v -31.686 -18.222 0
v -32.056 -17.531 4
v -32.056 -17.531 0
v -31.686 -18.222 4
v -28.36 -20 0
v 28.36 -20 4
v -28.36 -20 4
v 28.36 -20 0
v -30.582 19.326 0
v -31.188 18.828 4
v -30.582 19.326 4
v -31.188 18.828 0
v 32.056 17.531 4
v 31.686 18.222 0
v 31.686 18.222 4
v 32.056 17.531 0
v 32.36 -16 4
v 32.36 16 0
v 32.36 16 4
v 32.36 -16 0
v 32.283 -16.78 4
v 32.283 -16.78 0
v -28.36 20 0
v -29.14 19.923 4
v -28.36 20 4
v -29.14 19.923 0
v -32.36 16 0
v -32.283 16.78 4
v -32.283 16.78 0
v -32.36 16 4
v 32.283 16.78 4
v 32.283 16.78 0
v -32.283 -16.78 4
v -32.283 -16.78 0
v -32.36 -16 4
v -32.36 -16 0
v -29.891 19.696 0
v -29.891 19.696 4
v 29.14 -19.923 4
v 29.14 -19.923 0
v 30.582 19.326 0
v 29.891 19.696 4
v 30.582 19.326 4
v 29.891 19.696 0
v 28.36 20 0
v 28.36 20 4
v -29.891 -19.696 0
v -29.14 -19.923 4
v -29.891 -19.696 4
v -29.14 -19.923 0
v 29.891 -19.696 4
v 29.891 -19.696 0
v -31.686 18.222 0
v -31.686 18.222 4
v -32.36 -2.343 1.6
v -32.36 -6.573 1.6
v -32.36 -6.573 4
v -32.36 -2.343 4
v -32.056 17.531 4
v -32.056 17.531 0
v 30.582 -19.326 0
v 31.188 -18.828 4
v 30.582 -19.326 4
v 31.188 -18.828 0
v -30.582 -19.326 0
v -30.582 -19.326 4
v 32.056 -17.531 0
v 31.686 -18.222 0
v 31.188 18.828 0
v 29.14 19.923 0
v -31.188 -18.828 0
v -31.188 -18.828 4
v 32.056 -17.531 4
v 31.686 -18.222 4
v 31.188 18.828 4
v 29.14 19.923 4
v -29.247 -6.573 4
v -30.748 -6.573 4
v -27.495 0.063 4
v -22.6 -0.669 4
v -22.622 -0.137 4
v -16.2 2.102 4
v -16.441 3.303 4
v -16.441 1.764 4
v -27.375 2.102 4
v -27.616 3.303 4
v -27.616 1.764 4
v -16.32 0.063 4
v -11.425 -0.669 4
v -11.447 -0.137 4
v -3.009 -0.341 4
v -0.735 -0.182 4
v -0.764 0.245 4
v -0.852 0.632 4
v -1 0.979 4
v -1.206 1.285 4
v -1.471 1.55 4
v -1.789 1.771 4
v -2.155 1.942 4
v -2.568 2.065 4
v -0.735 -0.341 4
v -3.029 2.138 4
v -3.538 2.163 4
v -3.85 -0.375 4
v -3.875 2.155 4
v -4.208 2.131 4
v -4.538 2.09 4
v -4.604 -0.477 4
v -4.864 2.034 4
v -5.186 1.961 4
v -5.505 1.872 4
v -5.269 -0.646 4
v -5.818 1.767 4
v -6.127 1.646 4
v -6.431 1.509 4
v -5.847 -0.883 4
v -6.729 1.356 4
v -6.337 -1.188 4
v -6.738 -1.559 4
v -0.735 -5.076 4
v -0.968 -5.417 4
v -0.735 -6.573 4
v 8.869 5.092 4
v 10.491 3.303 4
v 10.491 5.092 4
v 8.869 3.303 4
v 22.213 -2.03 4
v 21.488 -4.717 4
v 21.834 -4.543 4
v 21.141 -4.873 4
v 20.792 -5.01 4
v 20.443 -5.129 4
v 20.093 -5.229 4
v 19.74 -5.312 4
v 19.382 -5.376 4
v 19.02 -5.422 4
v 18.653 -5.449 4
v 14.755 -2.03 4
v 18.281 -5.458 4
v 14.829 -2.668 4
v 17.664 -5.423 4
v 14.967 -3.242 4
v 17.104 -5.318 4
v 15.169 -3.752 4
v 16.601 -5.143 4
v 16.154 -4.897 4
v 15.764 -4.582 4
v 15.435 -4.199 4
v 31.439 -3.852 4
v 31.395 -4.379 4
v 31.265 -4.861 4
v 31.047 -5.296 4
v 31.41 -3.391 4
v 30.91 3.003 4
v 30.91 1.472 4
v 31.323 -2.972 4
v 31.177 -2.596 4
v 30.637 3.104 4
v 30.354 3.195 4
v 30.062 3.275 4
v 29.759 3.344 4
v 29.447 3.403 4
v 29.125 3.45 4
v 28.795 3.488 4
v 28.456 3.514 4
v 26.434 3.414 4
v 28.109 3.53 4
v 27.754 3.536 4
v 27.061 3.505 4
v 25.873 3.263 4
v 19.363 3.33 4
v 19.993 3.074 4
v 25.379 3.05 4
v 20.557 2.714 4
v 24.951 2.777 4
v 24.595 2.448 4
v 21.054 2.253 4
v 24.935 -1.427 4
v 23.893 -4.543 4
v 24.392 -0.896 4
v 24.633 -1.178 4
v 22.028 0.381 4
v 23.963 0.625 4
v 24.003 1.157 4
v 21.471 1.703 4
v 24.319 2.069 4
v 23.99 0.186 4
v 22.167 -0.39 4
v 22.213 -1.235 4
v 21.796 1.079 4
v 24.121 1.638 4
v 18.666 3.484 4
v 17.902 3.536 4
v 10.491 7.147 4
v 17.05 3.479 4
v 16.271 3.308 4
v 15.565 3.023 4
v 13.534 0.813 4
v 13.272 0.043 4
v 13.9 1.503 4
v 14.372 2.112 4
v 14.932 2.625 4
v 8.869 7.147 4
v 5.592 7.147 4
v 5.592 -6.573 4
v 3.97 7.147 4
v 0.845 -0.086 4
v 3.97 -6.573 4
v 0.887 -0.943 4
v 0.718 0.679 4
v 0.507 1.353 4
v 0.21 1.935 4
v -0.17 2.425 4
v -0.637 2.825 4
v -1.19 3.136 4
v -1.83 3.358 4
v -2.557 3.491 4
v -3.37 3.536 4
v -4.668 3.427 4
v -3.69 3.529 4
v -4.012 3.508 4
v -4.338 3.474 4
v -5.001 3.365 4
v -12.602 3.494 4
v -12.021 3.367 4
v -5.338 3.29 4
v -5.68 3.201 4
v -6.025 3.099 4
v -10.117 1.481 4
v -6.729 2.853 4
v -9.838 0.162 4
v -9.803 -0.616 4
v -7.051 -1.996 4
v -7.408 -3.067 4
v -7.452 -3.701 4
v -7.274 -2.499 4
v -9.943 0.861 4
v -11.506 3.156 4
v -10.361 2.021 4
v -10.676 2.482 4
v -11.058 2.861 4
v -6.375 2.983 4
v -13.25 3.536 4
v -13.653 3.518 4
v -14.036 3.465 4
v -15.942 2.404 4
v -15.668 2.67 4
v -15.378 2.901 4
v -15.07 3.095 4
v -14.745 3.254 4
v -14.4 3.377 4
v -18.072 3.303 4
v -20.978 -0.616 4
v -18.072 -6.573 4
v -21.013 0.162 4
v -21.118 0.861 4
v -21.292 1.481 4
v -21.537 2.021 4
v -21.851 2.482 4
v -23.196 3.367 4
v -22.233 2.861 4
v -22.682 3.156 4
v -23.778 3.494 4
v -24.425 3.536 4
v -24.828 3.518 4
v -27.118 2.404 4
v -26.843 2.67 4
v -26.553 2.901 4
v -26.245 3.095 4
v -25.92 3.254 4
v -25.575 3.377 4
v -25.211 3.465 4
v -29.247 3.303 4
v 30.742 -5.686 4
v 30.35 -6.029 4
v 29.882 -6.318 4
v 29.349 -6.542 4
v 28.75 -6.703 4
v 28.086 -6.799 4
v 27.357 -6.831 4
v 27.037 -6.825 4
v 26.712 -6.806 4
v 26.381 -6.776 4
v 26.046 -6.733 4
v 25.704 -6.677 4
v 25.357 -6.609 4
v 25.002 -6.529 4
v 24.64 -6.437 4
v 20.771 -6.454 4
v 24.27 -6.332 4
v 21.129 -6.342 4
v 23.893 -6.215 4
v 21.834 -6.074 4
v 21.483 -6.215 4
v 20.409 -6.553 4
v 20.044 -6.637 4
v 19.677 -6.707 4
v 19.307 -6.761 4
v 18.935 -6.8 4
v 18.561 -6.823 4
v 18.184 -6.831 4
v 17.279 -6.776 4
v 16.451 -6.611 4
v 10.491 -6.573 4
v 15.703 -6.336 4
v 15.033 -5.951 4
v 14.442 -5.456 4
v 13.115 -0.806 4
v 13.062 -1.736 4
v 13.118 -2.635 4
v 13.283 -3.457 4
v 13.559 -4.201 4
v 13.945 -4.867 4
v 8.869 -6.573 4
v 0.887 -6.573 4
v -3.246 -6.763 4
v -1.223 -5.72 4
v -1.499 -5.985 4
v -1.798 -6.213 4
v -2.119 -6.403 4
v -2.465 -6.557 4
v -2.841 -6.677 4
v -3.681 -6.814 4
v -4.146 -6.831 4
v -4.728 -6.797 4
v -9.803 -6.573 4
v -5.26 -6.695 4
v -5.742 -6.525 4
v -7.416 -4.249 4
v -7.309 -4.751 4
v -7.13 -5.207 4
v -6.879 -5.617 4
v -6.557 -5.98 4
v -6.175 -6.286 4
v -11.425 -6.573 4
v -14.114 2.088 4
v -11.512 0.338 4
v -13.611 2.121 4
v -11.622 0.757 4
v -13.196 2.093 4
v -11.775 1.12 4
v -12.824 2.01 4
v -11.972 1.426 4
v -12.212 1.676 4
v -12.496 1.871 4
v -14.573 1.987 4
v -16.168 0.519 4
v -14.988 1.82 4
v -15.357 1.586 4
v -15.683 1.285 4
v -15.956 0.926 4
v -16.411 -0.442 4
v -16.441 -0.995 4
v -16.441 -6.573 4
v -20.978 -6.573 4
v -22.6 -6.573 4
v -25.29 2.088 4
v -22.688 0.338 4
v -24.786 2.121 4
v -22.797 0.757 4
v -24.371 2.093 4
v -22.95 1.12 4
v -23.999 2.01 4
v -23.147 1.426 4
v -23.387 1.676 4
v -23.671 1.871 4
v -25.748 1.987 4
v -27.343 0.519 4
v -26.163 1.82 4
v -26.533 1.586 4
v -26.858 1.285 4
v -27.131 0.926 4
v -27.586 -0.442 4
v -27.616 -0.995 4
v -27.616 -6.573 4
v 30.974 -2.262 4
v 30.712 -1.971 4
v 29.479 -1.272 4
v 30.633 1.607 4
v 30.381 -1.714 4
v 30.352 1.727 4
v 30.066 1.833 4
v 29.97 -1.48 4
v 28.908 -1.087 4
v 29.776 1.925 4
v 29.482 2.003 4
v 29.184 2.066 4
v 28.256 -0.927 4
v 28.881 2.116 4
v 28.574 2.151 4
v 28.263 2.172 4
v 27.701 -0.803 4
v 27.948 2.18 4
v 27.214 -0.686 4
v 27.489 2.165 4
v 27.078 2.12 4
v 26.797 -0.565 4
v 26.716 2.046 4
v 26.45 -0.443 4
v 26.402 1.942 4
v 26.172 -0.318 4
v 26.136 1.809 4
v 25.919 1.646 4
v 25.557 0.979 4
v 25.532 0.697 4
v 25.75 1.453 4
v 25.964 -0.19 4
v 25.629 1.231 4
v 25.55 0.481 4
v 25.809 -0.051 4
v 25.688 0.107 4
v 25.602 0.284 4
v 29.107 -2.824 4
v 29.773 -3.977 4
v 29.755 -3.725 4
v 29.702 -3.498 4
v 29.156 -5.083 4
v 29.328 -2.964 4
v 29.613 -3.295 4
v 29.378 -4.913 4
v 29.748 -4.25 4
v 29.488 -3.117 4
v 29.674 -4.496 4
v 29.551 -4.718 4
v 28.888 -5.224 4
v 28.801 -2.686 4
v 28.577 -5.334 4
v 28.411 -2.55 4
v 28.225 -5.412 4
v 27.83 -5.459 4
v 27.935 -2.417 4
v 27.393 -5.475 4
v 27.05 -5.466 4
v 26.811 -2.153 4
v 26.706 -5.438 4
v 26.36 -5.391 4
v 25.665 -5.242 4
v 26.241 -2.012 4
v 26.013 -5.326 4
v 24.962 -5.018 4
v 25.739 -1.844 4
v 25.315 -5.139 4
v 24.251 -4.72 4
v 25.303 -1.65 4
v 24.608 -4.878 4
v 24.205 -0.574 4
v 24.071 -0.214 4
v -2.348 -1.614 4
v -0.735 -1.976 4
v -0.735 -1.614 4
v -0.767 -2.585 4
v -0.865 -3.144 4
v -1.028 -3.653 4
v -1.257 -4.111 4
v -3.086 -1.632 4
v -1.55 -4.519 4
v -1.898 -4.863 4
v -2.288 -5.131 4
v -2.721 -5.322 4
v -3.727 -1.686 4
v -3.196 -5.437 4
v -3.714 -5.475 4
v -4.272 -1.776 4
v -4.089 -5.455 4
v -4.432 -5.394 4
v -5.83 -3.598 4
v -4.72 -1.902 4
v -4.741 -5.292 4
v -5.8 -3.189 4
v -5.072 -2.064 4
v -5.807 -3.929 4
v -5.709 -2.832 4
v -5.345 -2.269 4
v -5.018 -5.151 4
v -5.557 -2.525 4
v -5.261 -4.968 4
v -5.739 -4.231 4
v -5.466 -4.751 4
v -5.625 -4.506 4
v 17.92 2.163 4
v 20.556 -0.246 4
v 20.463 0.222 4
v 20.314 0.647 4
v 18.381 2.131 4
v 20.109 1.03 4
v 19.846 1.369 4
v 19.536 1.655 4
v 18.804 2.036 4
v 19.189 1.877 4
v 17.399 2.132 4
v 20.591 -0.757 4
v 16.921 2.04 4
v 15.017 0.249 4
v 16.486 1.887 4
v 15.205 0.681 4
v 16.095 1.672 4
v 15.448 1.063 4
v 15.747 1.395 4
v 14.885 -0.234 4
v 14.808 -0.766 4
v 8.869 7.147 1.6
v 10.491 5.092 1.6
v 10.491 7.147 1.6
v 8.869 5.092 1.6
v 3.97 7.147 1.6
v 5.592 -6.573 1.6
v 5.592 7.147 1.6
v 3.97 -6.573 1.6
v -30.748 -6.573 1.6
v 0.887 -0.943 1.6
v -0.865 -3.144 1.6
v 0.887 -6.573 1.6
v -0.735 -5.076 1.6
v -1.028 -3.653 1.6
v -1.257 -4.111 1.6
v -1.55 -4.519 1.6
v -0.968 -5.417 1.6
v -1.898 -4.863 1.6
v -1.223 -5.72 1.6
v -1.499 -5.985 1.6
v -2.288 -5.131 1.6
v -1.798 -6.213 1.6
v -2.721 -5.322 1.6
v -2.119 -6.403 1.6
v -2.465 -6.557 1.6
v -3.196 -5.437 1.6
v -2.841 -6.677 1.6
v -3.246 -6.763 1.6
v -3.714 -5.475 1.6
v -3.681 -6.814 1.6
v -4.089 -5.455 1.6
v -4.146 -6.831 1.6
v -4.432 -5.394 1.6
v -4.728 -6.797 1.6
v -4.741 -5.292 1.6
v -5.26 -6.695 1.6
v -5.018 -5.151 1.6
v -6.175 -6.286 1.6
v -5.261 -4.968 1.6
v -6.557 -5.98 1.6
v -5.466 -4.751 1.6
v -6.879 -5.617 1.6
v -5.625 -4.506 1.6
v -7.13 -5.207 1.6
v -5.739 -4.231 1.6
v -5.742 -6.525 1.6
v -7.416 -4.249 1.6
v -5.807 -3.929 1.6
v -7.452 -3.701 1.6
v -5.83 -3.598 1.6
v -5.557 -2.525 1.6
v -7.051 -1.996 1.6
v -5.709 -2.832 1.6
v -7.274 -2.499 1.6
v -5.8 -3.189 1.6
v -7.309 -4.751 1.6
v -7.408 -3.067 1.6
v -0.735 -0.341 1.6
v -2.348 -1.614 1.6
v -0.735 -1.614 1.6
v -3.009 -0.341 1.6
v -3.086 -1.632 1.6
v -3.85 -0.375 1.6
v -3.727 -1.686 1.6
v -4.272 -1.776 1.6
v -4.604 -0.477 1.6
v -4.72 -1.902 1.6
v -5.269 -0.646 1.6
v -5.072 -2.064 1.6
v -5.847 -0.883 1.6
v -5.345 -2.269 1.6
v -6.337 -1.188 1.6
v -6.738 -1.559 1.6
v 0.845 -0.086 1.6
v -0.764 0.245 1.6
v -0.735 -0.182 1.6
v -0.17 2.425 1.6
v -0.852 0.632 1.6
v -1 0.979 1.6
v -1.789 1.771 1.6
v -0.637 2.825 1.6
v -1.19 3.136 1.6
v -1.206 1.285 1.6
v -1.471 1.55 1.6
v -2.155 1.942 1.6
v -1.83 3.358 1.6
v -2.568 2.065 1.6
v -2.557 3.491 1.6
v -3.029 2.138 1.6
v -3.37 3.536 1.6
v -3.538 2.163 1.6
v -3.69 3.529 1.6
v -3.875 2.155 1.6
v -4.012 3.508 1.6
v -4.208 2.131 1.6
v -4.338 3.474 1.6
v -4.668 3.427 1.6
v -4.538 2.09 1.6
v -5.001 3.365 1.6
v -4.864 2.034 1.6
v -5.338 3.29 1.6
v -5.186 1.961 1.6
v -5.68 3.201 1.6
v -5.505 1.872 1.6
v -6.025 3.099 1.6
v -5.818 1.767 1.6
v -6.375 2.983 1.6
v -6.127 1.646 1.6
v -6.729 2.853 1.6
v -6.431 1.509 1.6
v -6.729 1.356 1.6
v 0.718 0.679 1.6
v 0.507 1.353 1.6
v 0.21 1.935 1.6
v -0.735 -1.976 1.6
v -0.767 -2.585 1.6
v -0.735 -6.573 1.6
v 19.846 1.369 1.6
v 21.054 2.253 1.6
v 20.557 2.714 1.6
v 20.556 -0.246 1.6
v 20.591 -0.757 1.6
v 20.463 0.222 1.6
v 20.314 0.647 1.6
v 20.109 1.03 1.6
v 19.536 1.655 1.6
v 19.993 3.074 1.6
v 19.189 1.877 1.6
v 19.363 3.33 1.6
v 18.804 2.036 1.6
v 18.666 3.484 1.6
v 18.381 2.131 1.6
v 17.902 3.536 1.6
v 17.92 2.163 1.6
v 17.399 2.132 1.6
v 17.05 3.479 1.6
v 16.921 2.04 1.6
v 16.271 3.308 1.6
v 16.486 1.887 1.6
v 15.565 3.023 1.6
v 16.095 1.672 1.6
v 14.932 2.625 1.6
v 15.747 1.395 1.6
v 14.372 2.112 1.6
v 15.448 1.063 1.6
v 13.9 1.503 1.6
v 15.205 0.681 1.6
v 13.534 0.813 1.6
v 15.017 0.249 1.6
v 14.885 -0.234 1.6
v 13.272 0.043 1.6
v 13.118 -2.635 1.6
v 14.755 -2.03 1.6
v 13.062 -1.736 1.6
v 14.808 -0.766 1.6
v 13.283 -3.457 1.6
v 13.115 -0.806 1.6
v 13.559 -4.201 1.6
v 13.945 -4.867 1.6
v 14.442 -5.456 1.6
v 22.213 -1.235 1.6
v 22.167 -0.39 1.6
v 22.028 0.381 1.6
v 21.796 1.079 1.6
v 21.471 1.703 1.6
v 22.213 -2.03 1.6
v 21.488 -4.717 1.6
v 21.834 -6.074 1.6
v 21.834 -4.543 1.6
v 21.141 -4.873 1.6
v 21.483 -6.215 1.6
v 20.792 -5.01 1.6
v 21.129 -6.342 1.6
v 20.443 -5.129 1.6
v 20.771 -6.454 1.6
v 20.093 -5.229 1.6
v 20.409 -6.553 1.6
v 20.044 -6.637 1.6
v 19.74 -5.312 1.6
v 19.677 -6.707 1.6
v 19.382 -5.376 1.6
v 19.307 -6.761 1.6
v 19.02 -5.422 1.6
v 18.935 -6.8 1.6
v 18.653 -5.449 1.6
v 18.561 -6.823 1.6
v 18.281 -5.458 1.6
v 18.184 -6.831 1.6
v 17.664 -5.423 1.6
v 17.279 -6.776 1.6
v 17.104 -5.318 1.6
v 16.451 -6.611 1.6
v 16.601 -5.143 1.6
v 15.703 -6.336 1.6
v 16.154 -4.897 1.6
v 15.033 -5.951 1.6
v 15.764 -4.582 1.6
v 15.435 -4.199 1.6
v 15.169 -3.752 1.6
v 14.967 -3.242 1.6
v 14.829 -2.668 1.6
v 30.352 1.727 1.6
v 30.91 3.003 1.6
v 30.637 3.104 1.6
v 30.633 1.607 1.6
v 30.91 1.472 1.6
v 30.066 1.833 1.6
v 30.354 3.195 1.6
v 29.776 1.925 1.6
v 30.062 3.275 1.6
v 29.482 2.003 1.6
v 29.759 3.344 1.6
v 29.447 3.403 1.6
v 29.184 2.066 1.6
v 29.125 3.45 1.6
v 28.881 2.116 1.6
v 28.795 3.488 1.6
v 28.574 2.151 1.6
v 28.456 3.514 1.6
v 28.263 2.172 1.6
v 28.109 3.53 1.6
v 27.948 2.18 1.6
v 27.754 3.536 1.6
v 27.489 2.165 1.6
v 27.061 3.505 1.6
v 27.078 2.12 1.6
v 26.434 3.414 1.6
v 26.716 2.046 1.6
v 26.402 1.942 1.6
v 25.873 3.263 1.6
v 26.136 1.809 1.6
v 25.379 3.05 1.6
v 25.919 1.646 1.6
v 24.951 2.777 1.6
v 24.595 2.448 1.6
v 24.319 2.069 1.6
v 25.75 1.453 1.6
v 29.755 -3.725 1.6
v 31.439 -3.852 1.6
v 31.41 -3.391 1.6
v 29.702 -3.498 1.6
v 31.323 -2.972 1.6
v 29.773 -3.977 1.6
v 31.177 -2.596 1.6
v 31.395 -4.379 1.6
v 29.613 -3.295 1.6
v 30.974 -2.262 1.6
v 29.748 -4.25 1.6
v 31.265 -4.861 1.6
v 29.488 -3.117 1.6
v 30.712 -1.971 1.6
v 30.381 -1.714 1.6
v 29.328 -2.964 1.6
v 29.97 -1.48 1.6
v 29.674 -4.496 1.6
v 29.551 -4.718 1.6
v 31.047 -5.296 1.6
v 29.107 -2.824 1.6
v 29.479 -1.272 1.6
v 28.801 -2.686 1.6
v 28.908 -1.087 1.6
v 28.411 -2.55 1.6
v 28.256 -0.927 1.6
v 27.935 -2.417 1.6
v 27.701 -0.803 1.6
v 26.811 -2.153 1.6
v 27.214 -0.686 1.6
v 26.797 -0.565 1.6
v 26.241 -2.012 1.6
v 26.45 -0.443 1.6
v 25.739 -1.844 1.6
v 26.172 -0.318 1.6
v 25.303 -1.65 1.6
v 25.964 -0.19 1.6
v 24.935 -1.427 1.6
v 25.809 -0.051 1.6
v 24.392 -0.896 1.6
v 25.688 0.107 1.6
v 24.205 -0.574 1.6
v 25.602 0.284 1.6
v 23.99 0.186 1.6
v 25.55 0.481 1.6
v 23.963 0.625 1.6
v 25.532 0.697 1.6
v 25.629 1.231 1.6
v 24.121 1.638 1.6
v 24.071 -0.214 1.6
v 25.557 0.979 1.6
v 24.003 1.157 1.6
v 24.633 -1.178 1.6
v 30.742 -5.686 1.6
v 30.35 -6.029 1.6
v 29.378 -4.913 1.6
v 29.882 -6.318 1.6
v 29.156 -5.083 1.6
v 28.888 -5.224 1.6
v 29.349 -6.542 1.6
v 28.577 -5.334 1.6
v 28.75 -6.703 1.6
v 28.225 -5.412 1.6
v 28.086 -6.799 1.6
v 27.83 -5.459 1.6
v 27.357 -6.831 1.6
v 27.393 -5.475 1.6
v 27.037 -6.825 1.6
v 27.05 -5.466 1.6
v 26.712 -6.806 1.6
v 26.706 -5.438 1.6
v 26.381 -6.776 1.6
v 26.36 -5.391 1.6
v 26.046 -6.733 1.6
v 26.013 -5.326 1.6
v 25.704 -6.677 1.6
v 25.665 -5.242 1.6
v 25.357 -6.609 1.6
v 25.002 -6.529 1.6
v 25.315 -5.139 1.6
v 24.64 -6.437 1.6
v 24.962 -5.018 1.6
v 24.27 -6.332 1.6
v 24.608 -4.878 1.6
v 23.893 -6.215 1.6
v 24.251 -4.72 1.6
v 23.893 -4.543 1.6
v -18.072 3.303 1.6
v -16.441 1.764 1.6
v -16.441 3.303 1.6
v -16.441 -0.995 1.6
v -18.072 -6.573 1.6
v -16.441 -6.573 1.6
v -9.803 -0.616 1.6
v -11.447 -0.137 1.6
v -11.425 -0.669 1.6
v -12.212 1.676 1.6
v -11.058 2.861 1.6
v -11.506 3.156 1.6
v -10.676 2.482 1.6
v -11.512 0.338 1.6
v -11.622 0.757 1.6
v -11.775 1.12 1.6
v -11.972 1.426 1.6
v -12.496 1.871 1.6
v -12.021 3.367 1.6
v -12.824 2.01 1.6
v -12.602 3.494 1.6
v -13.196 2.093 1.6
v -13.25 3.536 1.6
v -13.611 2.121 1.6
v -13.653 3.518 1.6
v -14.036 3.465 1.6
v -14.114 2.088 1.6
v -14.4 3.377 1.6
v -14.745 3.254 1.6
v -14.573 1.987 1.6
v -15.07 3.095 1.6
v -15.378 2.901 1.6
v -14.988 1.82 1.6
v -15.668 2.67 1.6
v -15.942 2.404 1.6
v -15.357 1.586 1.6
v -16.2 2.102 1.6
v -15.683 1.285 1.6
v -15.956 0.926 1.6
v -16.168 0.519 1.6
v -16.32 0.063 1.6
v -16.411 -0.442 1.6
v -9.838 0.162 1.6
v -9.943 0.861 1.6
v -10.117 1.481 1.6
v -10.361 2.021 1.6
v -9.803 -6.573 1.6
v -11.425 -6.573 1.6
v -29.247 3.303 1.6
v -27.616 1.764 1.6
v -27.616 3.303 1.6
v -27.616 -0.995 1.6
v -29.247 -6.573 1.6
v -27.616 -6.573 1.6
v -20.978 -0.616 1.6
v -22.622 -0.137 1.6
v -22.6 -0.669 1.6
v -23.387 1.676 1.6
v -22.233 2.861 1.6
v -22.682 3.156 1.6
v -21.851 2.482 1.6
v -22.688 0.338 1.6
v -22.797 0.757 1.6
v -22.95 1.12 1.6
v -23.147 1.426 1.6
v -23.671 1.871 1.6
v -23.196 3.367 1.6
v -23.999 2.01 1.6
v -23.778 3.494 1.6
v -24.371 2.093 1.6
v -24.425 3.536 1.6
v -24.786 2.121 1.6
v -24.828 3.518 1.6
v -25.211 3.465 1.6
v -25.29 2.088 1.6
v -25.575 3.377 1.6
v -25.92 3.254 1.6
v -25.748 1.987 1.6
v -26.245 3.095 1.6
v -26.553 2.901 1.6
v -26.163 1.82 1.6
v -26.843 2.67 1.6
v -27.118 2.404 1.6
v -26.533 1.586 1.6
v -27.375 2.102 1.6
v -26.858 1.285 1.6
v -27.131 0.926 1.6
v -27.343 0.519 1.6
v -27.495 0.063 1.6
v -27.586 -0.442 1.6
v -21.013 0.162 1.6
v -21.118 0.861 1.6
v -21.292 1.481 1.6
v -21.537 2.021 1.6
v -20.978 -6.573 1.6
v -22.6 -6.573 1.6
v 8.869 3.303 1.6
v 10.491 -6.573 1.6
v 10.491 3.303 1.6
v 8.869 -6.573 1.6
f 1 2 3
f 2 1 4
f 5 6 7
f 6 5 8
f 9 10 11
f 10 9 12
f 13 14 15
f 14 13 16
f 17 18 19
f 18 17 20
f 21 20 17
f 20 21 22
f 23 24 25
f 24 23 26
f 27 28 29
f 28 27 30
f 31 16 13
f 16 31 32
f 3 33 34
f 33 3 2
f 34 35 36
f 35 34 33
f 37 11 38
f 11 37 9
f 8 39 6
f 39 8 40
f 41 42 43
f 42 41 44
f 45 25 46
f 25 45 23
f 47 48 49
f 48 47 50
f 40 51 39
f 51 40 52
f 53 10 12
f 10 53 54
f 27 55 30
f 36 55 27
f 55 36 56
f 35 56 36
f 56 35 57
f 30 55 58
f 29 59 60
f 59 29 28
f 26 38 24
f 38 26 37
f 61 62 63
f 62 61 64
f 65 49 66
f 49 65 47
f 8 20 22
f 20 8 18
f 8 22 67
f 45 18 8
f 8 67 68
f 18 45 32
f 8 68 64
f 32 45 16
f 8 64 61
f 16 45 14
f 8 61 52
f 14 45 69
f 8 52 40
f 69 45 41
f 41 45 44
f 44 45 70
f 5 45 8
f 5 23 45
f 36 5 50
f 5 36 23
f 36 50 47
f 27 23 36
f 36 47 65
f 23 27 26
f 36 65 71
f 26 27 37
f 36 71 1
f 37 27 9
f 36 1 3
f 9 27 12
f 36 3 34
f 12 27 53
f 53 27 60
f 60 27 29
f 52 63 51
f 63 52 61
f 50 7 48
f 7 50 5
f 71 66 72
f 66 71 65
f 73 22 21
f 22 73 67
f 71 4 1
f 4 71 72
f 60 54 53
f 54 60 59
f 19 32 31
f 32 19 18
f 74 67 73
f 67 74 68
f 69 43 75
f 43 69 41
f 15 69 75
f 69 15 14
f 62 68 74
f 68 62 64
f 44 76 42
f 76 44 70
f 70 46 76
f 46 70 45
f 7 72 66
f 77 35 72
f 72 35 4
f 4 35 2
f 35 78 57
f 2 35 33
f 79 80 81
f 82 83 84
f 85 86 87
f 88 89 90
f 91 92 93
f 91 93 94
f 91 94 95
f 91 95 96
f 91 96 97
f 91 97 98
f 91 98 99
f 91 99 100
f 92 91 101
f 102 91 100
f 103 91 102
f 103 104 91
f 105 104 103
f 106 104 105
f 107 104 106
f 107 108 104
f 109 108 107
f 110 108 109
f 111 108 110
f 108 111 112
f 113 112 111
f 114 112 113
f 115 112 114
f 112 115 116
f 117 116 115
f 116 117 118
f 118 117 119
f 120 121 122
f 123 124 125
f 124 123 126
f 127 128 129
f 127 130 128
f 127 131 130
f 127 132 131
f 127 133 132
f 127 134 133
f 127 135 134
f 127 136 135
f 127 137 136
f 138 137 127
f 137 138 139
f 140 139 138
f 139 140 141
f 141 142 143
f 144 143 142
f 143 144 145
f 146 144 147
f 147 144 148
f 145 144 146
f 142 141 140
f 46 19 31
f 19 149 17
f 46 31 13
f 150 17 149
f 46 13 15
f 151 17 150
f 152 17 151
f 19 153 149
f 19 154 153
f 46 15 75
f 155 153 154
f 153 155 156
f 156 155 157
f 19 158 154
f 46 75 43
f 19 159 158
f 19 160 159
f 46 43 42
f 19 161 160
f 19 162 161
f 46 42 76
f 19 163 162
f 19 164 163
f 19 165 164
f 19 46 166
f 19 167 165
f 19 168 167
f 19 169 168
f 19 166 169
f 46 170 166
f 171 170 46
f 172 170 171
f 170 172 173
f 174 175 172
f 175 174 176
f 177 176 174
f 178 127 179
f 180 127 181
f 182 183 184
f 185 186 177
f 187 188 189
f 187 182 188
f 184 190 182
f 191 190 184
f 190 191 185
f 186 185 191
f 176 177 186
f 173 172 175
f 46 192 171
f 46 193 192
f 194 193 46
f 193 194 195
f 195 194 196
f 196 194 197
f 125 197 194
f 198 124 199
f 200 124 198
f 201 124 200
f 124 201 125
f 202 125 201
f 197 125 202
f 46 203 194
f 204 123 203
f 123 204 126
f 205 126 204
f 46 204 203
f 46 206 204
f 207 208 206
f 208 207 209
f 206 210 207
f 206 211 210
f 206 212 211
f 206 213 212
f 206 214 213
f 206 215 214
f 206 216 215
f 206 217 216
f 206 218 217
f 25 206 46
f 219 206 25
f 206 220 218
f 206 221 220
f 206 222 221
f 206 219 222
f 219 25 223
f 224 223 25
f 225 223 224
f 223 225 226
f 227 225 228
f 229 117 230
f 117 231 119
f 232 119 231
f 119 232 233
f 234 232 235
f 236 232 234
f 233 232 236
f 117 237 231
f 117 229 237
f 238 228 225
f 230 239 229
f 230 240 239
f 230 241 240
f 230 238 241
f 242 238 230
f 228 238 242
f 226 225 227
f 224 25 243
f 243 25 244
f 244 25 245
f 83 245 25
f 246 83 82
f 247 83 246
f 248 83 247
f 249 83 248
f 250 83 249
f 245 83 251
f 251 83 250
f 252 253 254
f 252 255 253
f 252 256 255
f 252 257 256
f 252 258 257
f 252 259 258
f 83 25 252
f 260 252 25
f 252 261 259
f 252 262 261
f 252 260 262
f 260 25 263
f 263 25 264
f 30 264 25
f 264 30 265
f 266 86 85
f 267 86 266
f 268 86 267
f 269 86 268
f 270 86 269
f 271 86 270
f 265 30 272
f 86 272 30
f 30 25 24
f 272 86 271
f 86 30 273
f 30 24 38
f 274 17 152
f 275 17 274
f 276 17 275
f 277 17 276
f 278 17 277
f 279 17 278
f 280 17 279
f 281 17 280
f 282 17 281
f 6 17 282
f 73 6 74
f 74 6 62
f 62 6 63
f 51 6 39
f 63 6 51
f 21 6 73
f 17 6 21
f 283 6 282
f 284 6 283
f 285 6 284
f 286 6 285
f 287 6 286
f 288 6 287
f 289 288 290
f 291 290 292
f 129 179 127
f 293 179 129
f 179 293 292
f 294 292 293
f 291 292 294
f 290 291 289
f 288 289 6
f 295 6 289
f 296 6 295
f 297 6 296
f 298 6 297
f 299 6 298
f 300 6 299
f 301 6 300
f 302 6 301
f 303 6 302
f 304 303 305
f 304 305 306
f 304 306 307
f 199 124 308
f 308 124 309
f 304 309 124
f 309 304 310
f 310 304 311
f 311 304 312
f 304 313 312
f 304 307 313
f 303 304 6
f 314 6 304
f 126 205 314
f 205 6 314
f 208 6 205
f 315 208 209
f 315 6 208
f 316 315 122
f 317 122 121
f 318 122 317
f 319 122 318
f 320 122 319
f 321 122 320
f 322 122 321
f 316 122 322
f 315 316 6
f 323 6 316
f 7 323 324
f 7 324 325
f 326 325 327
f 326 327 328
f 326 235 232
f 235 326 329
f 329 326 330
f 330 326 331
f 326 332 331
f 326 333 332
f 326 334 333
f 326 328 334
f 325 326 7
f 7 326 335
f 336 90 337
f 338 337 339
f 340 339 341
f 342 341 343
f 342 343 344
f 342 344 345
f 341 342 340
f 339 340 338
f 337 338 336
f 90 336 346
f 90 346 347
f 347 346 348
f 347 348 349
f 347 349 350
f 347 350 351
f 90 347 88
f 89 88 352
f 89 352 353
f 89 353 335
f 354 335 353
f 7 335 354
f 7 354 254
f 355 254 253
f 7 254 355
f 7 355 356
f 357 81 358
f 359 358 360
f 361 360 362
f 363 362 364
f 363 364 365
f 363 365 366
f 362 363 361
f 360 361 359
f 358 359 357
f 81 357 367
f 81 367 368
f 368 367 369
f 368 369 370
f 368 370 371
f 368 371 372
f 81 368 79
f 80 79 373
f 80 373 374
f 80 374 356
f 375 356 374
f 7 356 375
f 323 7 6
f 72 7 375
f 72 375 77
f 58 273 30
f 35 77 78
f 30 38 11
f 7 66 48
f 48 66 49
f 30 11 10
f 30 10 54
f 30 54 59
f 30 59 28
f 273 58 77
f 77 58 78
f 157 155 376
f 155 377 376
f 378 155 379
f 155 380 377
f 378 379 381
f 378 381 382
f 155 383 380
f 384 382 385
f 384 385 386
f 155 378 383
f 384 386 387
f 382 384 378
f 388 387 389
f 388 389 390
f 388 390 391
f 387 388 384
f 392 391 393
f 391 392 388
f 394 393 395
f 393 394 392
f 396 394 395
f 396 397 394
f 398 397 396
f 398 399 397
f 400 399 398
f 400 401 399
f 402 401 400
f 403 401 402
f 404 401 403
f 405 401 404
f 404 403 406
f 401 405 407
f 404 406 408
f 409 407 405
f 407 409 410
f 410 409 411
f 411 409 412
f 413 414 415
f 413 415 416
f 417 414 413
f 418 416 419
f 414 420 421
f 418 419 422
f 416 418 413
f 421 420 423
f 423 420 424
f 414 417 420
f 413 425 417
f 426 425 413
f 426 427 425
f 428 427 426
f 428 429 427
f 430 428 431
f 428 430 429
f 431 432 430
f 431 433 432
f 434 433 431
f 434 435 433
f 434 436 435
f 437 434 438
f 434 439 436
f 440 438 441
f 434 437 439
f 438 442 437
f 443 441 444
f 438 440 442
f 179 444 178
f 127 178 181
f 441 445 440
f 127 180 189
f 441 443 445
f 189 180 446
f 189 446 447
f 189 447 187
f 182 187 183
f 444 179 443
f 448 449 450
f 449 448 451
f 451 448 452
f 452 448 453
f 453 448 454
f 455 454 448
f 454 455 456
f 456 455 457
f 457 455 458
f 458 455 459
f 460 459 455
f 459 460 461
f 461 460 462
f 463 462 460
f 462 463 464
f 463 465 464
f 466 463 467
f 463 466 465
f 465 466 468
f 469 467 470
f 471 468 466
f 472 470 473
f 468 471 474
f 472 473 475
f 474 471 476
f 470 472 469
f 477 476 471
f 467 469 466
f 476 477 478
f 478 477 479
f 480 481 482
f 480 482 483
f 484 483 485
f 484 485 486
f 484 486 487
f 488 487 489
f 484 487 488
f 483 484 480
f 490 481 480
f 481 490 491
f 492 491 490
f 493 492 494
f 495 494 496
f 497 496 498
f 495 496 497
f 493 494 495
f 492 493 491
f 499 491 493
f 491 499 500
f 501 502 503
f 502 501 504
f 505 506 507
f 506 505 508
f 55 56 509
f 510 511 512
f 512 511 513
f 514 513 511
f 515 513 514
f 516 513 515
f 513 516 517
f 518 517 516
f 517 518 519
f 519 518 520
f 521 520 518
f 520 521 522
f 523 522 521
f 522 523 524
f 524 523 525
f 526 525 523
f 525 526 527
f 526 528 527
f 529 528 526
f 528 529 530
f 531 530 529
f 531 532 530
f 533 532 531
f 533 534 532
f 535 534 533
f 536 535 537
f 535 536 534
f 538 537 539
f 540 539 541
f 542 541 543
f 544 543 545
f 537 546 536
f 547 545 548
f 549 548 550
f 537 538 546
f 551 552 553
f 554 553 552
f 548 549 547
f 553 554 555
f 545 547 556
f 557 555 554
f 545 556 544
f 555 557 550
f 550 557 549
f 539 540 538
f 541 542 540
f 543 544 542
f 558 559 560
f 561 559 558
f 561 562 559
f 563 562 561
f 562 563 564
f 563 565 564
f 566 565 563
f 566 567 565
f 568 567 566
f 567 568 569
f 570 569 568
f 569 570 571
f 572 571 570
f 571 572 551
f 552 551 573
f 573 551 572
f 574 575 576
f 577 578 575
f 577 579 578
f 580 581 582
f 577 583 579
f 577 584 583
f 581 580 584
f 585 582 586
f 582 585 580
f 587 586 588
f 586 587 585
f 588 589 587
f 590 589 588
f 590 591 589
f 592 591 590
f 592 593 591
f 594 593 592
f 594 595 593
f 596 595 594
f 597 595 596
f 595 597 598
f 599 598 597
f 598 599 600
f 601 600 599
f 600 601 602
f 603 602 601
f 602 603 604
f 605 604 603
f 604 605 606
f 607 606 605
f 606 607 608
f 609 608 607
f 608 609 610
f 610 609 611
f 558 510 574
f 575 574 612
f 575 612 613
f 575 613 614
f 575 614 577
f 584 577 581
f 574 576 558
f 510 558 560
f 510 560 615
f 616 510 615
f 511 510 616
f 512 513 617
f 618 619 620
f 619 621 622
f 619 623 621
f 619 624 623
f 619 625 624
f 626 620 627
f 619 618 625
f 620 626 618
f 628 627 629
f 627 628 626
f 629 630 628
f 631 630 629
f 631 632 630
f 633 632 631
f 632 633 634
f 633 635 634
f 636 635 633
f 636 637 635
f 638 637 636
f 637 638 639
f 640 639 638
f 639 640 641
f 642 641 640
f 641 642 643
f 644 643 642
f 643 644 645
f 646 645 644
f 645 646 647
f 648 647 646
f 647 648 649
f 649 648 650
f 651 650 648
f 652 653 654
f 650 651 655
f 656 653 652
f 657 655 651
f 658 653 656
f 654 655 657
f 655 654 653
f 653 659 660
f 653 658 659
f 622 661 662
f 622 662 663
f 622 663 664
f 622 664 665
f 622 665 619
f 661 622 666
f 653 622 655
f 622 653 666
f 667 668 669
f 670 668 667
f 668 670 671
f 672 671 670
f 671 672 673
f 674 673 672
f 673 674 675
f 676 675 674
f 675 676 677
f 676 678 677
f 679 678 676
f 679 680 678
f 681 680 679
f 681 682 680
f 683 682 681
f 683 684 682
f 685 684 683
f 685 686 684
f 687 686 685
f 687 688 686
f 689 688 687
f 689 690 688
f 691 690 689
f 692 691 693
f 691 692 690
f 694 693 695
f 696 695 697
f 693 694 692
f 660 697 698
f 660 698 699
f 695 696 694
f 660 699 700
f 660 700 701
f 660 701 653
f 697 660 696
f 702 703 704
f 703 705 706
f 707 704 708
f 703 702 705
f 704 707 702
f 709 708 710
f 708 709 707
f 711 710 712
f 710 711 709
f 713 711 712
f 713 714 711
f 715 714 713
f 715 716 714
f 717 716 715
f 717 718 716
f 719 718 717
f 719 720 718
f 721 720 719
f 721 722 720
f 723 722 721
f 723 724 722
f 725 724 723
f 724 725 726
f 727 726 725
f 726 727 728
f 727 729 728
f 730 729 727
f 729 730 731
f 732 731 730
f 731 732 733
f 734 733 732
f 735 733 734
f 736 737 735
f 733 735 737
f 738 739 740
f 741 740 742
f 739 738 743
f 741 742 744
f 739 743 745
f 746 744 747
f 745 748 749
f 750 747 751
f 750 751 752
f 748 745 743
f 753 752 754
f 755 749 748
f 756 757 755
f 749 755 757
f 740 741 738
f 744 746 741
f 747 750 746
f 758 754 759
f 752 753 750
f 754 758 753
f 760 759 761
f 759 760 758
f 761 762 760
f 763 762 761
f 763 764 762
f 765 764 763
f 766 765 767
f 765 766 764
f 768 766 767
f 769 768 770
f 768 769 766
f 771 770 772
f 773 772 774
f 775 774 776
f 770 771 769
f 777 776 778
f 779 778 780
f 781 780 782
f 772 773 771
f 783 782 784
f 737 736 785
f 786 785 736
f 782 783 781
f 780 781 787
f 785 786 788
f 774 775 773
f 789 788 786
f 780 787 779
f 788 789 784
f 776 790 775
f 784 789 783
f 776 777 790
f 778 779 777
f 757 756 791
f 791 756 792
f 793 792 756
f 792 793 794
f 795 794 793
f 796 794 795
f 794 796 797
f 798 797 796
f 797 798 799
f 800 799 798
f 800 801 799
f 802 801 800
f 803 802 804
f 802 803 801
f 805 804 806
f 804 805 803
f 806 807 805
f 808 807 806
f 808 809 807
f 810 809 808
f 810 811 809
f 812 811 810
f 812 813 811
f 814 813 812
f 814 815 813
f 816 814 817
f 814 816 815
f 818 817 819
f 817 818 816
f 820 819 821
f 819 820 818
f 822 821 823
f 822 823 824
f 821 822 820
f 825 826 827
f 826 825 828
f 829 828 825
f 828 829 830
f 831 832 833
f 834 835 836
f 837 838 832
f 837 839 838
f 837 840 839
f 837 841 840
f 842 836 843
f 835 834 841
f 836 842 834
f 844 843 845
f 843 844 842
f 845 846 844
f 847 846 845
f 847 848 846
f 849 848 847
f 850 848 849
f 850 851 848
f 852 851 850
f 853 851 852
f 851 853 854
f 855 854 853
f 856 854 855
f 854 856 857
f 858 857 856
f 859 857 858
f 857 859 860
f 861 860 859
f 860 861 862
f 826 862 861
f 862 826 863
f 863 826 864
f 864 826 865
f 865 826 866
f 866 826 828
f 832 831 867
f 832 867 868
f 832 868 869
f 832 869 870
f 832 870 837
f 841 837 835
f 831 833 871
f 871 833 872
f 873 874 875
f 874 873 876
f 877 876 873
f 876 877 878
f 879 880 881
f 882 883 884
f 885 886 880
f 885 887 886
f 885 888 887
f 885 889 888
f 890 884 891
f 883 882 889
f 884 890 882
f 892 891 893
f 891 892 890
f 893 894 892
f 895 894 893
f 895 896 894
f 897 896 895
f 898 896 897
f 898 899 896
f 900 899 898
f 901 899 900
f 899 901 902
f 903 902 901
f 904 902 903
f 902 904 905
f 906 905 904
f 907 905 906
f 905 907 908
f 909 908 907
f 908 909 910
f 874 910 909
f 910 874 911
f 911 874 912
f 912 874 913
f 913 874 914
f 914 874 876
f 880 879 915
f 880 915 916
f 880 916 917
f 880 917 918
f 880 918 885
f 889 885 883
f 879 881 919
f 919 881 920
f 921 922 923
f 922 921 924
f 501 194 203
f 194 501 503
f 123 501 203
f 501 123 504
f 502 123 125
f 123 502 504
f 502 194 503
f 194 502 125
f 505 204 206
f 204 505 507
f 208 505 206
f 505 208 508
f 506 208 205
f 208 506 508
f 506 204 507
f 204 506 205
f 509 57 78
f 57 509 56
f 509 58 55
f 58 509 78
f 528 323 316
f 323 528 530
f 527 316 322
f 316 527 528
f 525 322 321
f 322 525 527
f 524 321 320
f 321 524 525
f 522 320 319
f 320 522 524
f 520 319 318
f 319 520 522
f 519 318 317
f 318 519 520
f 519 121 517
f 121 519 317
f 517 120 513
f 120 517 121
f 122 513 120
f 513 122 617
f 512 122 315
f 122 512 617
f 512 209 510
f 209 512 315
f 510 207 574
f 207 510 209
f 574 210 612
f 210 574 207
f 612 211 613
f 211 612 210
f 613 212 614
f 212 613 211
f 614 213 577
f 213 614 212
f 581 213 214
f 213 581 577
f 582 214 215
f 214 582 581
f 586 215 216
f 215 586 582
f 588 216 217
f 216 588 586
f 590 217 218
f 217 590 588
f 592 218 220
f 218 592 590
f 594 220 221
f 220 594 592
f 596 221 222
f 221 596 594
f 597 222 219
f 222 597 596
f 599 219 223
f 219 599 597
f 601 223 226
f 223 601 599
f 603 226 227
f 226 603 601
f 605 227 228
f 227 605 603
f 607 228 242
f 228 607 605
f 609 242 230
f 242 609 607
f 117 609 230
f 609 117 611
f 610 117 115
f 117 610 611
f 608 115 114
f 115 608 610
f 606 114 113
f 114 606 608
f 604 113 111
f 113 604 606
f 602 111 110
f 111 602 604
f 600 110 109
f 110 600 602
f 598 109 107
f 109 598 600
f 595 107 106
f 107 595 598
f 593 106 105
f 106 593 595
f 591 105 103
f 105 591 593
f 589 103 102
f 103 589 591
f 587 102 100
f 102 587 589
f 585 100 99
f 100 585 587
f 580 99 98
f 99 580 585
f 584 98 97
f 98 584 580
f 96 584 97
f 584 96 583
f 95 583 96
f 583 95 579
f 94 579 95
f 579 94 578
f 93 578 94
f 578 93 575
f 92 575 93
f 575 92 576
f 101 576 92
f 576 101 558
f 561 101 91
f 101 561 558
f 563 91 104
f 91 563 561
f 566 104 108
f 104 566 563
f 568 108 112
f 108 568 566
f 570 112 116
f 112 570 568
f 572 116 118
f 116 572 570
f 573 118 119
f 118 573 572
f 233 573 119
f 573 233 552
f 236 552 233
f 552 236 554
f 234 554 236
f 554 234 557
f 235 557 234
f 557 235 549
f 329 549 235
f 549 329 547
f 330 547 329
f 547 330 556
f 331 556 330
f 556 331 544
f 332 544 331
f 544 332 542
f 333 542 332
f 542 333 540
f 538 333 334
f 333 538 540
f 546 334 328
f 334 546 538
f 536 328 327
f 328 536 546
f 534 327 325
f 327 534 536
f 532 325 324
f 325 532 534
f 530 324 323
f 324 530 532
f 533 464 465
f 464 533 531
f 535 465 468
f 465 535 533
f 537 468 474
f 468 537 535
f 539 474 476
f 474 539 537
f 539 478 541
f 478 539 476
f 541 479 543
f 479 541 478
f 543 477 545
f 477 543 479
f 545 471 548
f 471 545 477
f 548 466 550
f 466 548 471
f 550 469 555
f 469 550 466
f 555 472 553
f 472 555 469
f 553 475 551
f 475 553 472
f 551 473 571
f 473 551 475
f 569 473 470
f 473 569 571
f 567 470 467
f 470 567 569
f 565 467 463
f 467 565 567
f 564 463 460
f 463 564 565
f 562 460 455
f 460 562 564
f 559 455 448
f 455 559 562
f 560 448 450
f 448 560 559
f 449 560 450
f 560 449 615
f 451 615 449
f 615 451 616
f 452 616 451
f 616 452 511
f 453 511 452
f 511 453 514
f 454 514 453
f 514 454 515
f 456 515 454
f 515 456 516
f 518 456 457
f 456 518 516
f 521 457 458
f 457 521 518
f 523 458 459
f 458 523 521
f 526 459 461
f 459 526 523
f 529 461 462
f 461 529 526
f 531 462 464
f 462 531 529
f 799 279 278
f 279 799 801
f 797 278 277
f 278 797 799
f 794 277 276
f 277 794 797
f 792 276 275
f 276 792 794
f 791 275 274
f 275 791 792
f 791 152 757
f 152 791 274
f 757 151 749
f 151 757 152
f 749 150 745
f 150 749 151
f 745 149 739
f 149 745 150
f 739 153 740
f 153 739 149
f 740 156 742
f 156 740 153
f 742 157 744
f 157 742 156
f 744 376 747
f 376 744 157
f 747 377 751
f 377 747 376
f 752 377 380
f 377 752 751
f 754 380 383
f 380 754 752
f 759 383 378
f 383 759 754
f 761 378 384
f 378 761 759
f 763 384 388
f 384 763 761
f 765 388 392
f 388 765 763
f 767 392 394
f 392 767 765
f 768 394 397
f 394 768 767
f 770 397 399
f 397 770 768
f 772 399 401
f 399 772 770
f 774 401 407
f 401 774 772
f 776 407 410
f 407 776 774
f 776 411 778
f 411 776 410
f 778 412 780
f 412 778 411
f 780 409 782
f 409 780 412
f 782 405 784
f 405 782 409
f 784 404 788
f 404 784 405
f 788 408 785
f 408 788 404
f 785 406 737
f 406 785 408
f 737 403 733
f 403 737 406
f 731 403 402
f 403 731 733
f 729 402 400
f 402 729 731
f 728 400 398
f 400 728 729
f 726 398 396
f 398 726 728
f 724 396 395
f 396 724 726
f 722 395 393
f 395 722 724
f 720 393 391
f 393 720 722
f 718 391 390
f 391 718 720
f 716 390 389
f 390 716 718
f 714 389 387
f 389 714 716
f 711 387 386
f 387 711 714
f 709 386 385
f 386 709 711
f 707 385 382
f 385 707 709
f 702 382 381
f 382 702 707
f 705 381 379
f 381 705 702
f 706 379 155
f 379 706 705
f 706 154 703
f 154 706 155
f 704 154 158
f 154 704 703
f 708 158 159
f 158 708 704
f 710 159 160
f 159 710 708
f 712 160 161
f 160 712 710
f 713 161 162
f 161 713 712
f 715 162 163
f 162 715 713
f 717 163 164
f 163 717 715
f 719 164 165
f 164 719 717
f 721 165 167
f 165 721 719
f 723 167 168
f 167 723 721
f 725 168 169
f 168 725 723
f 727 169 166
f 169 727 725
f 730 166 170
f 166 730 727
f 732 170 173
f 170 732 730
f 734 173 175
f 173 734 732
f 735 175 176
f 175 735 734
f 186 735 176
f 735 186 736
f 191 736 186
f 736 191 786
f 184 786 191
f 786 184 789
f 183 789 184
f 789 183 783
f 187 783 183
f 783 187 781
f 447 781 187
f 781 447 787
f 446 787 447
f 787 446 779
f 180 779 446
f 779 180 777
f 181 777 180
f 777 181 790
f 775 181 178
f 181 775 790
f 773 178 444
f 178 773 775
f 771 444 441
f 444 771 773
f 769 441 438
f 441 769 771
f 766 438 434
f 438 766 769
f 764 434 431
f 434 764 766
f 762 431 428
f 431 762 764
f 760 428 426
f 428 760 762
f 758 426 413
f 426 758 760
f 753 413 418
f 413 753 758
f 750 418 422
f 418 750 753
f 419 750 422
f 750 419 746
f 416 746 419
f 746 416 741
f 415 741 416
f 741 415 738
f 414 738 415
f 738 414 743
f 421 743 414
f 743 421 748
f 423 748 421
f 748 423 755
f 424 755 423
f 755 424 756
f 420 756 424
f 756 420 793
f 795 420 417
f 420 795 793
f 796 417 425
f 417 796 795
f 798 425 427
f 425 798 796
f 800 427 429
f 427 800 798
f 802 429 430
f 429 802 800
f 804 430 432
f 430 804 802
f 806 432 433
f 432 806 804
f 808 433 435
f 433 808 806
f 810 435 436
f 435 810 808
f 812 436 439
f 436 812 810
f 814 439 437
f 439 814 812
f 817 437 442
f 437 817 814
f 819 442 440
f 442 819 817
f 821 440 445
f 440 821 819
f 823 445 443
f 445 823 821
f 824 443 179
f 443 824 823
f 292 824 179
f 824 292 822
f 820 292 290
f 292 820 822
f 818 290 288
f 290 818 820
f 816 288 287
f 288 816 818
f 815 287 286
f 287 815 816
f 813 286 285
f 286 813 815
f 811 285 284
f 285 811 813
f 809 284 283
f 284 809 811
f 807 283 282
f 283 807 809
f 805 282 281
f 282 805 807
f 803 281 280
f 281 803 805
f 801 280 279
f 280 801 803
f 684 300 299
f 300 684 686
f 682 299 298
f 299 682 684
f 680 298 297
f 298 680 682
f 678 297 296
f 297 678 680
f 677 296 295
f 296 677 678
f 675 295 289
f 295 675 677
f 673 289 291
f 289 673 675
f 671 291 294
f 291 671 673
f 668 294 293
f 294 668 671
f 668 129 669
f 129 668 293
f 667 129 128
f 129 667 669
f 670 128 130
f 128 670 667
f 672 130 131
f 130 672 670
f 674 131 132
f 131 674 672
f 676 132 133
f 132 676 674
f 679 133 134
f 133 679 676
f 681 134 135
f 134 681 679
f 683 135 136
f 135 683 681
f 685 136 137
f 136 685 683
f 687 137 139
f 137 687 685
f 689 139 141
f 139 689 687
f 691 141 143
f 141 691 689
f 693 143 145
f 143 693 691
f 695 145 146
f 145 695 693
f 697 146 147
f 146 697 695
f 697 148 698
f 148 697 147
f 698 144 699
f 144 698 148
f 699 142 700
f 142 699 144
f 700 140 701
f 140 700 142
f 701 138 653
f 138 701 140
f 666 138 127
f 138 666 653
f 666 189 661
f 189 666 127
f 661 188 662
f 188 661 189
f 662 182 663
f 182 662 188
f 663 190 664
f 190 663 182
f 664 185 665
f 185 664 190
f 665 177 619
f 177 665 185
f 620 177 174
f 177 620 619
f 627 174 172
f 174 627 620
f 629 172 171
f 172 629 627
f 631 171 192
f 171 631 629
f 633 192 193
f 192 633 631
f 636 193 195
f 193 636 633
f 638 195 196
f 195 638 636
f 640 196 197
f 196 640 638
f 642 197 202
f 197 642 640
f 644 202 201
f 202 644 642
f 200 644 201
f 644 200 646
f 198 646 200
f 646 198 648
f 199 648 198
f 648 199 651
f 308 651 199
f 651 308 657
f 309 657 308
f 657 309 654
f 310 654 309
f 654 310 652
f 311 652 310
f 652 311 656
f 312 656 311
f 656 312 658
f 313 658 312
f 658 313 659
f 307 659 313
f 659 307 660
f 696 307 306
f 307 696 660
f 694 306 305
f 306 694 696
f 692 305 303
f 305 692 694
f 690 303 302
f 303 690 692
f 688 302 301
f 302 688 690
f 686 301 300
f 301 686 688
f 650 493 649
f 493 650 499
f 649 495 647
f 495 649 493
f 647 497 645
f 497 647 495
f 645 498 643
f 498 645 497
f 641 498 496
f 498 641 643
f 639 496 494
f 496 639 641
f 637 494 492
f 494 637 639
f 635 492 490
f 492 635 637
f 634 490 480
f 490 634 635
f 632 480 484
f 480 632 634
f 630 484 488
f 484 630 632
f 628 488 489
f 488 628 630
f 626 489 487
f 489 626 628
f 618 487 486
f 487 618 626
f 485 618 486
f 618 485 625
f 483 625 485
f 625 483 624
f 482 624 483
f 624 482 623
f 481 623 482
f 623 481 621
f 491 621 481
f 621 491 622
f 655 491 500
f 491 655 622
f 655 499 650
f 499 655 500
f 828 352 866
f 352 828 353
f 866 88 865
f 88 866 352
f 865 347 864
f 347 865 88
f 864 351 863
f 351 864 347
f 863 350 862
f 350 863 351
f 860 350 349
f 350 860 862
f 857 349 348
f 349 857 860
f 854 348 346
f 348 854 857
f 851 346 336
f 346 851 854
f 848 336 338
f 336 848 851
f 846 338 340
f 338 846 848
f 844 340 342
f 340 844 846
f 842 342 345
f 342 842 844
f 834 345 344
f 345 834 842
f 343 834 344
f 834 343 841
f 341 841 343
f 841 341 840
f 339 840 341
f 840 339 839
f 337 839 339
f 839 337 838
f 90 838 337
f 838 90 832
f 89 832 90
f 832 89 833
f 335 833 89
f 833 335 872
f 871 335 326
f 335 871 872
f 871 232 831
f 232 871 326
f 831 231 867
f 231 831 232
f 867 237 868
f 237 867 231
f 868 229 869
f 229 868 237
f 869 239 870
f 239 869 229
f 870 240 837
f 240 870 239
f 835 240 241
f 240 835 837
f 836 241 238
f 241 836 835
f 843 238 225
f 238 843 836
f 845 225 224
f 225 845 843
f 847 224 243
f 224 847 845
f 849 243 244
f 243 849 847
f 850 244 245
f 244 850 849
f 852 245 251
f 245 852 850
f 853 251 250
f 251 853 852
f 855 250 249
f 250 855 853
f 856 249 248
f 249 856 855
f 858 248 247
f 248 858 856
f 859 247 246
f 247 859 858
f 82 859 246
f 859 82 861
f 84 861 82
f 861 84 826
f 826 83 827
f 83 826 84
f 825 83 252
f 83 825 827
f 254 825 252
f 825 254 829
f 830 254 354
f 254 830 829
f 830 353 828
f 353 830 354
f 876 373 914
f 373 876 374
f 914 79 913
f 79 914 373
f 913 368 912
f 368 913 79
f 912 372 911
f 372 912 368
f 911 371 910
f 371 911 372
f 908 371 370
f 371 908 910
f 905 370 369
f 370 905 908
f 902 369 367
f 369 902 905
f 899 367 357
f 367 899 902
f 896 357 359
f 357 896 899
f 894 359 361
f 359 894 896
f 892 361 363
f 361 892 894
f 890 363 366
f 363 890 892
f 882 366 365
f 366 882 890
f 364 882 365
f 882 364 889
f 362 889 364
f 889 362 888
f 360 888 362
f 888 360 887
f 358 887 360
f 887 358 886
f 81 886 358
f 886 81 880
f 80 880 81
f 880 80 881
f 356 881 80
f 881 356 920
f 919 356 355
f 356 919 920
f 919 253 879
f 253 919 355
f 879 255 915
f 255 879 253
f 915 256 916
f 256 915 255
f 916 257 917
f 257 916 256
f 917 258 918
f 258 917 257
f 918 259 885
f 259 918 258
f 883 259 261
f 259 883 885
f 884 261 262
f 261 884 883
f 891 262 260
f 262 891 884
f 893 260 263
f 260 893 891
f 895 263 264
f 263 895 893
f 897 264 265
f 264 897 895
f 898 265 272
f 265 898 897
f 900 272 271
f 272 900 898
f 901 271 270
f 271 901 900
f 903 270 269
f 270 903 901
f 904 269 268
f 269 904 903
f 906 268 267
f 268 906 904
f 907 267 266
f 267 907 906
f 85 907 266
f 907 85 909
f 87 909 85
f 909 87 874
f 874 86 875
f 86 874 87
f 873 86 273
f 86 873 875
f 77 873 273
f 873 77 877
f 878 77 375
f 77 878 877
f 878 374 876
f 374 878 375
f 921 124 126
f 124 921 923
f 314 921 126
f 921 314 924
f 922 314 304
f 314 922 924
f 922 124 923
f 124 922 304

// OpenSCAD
$fn = 32;

module rounded_cube(x, y, z, r) {
        dx = x - (r*2);
        dy = y - (r*2);
        hull() {
                translate([-dx/2,-dy/2]) cylinder(r=r, h=z);
                translate([-dx/2,dy/2]) cylinder(r=r, h=z);
                translate([dx/2,-dy/2]) cylinder(r=r, h=z);
                translate([dx/2,dy/2]) cylinder(r=r, h=z);
        }
}

name = "Annaliese";

difference() {
	rounded_cube(40*1.618, 40, 4, 4);
	translate([0,0,1.6]) linear_extrude(4) text(name, size=13, font="TeX Gyre Chorus", halign="center", valign="center");
}
